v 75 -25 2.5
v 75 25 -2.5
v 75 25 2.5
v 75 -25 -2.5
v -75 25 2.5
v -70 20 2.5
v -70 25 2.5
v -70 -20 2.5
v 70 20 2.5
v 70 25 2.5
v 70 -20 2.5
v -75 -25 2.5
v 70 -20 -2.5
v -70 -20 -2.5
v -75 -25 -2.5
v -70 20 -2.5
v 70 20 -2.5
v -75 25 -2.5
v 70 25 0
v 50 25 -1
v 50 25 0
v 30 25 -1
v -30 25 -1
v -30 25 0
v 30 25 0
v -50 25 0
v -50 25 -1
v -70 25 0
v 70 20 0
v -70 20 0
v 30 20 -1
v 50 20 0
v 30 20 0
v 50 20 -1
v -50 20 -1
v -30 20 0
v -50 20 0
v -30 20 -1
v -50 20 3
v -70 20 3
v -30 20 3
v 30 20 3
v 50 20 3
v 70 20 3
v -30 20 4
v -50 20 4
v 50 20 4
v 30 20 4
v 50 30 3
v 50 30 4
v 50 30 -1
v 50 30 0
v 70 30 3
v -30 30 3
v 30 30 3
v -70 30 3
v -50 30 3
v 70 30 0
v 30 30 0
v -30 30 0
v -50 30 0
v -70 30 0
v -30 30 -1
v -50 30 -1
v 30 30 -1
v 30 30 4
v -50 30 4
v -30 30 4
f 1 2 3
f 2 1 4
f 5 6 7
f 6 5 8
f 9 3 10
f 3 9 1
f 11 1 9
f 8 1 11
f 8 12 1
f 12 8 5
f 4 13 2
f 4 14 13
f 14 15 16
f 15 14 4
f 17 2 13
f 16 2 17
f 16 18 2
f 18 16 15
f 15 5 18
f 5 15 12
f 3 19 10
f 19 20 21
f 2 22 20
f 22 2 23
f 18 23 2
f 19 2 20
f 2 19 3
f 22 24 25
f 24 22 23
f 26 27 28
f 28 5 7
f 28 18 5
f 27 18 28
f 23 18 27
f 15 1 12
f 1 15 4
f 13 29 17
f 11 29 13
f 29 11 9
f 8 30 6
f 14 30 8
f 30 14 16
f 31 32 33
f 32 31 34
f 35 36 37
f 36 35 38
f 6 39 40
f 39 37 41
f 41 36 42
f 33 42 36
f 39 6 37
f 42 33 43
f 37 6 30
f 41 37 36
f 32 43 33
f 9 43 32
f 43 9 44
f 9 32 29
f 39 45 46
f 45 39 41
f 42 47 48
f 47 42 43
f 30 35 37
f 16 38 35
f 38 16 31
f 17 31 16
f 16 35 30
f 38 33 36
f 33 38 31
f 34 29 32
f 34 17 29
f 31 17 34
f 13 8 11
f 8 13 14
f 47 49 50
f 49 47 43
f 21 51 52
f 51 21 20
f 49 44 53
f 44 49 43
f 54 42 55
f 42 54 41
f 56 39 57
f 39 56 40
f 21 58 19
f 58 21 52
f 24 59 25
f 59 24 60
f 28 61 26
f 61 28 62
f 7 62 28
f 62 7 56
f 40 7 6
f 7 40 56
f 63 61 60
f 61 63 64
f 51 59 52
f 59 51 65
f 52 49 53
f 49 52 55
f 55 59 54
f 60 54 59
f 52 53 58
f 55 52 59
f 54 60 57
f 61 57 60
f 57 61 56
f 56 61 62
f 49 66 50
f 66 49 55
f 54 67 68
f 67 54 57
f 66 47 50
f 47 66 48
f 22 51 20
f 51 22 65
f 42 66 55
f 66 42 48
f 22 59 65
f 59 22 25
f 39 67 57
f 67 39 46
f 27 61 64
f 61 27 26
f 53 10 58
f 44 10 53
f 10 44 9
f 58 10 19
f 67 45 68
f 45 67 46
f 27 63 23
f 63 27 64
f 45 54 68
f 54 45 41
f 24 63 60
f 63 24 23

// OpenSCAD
union() {
	difference() {
		cube(center = true, size = [150, 50, 5]);
		translate(v = [0, 0, 0.5000000000]) {
			cube(center = true, size = [140, 40, 6]);
		}
	}
	translate(v = [-70.0000000000, 20.0000000000, 0]) {
		union() {
			cube(size = [120, 10, 3]);
			translate(v = [100, 0, -1.0000000000]) {
				cube(size = [20, 10, 5]);
			}
		}
	}
	mirror(v = [1, 0, 0]) {
		translate(v = [-70.0000000000, 20.0000000000, 0]) {
			union() {
				cube(size = [120, 10, 3]);
				translate(v = [100, 0, -1.0000000000]) {
					cube(size = [20, 10, 5]);
				}
			}
		}
	}
}
